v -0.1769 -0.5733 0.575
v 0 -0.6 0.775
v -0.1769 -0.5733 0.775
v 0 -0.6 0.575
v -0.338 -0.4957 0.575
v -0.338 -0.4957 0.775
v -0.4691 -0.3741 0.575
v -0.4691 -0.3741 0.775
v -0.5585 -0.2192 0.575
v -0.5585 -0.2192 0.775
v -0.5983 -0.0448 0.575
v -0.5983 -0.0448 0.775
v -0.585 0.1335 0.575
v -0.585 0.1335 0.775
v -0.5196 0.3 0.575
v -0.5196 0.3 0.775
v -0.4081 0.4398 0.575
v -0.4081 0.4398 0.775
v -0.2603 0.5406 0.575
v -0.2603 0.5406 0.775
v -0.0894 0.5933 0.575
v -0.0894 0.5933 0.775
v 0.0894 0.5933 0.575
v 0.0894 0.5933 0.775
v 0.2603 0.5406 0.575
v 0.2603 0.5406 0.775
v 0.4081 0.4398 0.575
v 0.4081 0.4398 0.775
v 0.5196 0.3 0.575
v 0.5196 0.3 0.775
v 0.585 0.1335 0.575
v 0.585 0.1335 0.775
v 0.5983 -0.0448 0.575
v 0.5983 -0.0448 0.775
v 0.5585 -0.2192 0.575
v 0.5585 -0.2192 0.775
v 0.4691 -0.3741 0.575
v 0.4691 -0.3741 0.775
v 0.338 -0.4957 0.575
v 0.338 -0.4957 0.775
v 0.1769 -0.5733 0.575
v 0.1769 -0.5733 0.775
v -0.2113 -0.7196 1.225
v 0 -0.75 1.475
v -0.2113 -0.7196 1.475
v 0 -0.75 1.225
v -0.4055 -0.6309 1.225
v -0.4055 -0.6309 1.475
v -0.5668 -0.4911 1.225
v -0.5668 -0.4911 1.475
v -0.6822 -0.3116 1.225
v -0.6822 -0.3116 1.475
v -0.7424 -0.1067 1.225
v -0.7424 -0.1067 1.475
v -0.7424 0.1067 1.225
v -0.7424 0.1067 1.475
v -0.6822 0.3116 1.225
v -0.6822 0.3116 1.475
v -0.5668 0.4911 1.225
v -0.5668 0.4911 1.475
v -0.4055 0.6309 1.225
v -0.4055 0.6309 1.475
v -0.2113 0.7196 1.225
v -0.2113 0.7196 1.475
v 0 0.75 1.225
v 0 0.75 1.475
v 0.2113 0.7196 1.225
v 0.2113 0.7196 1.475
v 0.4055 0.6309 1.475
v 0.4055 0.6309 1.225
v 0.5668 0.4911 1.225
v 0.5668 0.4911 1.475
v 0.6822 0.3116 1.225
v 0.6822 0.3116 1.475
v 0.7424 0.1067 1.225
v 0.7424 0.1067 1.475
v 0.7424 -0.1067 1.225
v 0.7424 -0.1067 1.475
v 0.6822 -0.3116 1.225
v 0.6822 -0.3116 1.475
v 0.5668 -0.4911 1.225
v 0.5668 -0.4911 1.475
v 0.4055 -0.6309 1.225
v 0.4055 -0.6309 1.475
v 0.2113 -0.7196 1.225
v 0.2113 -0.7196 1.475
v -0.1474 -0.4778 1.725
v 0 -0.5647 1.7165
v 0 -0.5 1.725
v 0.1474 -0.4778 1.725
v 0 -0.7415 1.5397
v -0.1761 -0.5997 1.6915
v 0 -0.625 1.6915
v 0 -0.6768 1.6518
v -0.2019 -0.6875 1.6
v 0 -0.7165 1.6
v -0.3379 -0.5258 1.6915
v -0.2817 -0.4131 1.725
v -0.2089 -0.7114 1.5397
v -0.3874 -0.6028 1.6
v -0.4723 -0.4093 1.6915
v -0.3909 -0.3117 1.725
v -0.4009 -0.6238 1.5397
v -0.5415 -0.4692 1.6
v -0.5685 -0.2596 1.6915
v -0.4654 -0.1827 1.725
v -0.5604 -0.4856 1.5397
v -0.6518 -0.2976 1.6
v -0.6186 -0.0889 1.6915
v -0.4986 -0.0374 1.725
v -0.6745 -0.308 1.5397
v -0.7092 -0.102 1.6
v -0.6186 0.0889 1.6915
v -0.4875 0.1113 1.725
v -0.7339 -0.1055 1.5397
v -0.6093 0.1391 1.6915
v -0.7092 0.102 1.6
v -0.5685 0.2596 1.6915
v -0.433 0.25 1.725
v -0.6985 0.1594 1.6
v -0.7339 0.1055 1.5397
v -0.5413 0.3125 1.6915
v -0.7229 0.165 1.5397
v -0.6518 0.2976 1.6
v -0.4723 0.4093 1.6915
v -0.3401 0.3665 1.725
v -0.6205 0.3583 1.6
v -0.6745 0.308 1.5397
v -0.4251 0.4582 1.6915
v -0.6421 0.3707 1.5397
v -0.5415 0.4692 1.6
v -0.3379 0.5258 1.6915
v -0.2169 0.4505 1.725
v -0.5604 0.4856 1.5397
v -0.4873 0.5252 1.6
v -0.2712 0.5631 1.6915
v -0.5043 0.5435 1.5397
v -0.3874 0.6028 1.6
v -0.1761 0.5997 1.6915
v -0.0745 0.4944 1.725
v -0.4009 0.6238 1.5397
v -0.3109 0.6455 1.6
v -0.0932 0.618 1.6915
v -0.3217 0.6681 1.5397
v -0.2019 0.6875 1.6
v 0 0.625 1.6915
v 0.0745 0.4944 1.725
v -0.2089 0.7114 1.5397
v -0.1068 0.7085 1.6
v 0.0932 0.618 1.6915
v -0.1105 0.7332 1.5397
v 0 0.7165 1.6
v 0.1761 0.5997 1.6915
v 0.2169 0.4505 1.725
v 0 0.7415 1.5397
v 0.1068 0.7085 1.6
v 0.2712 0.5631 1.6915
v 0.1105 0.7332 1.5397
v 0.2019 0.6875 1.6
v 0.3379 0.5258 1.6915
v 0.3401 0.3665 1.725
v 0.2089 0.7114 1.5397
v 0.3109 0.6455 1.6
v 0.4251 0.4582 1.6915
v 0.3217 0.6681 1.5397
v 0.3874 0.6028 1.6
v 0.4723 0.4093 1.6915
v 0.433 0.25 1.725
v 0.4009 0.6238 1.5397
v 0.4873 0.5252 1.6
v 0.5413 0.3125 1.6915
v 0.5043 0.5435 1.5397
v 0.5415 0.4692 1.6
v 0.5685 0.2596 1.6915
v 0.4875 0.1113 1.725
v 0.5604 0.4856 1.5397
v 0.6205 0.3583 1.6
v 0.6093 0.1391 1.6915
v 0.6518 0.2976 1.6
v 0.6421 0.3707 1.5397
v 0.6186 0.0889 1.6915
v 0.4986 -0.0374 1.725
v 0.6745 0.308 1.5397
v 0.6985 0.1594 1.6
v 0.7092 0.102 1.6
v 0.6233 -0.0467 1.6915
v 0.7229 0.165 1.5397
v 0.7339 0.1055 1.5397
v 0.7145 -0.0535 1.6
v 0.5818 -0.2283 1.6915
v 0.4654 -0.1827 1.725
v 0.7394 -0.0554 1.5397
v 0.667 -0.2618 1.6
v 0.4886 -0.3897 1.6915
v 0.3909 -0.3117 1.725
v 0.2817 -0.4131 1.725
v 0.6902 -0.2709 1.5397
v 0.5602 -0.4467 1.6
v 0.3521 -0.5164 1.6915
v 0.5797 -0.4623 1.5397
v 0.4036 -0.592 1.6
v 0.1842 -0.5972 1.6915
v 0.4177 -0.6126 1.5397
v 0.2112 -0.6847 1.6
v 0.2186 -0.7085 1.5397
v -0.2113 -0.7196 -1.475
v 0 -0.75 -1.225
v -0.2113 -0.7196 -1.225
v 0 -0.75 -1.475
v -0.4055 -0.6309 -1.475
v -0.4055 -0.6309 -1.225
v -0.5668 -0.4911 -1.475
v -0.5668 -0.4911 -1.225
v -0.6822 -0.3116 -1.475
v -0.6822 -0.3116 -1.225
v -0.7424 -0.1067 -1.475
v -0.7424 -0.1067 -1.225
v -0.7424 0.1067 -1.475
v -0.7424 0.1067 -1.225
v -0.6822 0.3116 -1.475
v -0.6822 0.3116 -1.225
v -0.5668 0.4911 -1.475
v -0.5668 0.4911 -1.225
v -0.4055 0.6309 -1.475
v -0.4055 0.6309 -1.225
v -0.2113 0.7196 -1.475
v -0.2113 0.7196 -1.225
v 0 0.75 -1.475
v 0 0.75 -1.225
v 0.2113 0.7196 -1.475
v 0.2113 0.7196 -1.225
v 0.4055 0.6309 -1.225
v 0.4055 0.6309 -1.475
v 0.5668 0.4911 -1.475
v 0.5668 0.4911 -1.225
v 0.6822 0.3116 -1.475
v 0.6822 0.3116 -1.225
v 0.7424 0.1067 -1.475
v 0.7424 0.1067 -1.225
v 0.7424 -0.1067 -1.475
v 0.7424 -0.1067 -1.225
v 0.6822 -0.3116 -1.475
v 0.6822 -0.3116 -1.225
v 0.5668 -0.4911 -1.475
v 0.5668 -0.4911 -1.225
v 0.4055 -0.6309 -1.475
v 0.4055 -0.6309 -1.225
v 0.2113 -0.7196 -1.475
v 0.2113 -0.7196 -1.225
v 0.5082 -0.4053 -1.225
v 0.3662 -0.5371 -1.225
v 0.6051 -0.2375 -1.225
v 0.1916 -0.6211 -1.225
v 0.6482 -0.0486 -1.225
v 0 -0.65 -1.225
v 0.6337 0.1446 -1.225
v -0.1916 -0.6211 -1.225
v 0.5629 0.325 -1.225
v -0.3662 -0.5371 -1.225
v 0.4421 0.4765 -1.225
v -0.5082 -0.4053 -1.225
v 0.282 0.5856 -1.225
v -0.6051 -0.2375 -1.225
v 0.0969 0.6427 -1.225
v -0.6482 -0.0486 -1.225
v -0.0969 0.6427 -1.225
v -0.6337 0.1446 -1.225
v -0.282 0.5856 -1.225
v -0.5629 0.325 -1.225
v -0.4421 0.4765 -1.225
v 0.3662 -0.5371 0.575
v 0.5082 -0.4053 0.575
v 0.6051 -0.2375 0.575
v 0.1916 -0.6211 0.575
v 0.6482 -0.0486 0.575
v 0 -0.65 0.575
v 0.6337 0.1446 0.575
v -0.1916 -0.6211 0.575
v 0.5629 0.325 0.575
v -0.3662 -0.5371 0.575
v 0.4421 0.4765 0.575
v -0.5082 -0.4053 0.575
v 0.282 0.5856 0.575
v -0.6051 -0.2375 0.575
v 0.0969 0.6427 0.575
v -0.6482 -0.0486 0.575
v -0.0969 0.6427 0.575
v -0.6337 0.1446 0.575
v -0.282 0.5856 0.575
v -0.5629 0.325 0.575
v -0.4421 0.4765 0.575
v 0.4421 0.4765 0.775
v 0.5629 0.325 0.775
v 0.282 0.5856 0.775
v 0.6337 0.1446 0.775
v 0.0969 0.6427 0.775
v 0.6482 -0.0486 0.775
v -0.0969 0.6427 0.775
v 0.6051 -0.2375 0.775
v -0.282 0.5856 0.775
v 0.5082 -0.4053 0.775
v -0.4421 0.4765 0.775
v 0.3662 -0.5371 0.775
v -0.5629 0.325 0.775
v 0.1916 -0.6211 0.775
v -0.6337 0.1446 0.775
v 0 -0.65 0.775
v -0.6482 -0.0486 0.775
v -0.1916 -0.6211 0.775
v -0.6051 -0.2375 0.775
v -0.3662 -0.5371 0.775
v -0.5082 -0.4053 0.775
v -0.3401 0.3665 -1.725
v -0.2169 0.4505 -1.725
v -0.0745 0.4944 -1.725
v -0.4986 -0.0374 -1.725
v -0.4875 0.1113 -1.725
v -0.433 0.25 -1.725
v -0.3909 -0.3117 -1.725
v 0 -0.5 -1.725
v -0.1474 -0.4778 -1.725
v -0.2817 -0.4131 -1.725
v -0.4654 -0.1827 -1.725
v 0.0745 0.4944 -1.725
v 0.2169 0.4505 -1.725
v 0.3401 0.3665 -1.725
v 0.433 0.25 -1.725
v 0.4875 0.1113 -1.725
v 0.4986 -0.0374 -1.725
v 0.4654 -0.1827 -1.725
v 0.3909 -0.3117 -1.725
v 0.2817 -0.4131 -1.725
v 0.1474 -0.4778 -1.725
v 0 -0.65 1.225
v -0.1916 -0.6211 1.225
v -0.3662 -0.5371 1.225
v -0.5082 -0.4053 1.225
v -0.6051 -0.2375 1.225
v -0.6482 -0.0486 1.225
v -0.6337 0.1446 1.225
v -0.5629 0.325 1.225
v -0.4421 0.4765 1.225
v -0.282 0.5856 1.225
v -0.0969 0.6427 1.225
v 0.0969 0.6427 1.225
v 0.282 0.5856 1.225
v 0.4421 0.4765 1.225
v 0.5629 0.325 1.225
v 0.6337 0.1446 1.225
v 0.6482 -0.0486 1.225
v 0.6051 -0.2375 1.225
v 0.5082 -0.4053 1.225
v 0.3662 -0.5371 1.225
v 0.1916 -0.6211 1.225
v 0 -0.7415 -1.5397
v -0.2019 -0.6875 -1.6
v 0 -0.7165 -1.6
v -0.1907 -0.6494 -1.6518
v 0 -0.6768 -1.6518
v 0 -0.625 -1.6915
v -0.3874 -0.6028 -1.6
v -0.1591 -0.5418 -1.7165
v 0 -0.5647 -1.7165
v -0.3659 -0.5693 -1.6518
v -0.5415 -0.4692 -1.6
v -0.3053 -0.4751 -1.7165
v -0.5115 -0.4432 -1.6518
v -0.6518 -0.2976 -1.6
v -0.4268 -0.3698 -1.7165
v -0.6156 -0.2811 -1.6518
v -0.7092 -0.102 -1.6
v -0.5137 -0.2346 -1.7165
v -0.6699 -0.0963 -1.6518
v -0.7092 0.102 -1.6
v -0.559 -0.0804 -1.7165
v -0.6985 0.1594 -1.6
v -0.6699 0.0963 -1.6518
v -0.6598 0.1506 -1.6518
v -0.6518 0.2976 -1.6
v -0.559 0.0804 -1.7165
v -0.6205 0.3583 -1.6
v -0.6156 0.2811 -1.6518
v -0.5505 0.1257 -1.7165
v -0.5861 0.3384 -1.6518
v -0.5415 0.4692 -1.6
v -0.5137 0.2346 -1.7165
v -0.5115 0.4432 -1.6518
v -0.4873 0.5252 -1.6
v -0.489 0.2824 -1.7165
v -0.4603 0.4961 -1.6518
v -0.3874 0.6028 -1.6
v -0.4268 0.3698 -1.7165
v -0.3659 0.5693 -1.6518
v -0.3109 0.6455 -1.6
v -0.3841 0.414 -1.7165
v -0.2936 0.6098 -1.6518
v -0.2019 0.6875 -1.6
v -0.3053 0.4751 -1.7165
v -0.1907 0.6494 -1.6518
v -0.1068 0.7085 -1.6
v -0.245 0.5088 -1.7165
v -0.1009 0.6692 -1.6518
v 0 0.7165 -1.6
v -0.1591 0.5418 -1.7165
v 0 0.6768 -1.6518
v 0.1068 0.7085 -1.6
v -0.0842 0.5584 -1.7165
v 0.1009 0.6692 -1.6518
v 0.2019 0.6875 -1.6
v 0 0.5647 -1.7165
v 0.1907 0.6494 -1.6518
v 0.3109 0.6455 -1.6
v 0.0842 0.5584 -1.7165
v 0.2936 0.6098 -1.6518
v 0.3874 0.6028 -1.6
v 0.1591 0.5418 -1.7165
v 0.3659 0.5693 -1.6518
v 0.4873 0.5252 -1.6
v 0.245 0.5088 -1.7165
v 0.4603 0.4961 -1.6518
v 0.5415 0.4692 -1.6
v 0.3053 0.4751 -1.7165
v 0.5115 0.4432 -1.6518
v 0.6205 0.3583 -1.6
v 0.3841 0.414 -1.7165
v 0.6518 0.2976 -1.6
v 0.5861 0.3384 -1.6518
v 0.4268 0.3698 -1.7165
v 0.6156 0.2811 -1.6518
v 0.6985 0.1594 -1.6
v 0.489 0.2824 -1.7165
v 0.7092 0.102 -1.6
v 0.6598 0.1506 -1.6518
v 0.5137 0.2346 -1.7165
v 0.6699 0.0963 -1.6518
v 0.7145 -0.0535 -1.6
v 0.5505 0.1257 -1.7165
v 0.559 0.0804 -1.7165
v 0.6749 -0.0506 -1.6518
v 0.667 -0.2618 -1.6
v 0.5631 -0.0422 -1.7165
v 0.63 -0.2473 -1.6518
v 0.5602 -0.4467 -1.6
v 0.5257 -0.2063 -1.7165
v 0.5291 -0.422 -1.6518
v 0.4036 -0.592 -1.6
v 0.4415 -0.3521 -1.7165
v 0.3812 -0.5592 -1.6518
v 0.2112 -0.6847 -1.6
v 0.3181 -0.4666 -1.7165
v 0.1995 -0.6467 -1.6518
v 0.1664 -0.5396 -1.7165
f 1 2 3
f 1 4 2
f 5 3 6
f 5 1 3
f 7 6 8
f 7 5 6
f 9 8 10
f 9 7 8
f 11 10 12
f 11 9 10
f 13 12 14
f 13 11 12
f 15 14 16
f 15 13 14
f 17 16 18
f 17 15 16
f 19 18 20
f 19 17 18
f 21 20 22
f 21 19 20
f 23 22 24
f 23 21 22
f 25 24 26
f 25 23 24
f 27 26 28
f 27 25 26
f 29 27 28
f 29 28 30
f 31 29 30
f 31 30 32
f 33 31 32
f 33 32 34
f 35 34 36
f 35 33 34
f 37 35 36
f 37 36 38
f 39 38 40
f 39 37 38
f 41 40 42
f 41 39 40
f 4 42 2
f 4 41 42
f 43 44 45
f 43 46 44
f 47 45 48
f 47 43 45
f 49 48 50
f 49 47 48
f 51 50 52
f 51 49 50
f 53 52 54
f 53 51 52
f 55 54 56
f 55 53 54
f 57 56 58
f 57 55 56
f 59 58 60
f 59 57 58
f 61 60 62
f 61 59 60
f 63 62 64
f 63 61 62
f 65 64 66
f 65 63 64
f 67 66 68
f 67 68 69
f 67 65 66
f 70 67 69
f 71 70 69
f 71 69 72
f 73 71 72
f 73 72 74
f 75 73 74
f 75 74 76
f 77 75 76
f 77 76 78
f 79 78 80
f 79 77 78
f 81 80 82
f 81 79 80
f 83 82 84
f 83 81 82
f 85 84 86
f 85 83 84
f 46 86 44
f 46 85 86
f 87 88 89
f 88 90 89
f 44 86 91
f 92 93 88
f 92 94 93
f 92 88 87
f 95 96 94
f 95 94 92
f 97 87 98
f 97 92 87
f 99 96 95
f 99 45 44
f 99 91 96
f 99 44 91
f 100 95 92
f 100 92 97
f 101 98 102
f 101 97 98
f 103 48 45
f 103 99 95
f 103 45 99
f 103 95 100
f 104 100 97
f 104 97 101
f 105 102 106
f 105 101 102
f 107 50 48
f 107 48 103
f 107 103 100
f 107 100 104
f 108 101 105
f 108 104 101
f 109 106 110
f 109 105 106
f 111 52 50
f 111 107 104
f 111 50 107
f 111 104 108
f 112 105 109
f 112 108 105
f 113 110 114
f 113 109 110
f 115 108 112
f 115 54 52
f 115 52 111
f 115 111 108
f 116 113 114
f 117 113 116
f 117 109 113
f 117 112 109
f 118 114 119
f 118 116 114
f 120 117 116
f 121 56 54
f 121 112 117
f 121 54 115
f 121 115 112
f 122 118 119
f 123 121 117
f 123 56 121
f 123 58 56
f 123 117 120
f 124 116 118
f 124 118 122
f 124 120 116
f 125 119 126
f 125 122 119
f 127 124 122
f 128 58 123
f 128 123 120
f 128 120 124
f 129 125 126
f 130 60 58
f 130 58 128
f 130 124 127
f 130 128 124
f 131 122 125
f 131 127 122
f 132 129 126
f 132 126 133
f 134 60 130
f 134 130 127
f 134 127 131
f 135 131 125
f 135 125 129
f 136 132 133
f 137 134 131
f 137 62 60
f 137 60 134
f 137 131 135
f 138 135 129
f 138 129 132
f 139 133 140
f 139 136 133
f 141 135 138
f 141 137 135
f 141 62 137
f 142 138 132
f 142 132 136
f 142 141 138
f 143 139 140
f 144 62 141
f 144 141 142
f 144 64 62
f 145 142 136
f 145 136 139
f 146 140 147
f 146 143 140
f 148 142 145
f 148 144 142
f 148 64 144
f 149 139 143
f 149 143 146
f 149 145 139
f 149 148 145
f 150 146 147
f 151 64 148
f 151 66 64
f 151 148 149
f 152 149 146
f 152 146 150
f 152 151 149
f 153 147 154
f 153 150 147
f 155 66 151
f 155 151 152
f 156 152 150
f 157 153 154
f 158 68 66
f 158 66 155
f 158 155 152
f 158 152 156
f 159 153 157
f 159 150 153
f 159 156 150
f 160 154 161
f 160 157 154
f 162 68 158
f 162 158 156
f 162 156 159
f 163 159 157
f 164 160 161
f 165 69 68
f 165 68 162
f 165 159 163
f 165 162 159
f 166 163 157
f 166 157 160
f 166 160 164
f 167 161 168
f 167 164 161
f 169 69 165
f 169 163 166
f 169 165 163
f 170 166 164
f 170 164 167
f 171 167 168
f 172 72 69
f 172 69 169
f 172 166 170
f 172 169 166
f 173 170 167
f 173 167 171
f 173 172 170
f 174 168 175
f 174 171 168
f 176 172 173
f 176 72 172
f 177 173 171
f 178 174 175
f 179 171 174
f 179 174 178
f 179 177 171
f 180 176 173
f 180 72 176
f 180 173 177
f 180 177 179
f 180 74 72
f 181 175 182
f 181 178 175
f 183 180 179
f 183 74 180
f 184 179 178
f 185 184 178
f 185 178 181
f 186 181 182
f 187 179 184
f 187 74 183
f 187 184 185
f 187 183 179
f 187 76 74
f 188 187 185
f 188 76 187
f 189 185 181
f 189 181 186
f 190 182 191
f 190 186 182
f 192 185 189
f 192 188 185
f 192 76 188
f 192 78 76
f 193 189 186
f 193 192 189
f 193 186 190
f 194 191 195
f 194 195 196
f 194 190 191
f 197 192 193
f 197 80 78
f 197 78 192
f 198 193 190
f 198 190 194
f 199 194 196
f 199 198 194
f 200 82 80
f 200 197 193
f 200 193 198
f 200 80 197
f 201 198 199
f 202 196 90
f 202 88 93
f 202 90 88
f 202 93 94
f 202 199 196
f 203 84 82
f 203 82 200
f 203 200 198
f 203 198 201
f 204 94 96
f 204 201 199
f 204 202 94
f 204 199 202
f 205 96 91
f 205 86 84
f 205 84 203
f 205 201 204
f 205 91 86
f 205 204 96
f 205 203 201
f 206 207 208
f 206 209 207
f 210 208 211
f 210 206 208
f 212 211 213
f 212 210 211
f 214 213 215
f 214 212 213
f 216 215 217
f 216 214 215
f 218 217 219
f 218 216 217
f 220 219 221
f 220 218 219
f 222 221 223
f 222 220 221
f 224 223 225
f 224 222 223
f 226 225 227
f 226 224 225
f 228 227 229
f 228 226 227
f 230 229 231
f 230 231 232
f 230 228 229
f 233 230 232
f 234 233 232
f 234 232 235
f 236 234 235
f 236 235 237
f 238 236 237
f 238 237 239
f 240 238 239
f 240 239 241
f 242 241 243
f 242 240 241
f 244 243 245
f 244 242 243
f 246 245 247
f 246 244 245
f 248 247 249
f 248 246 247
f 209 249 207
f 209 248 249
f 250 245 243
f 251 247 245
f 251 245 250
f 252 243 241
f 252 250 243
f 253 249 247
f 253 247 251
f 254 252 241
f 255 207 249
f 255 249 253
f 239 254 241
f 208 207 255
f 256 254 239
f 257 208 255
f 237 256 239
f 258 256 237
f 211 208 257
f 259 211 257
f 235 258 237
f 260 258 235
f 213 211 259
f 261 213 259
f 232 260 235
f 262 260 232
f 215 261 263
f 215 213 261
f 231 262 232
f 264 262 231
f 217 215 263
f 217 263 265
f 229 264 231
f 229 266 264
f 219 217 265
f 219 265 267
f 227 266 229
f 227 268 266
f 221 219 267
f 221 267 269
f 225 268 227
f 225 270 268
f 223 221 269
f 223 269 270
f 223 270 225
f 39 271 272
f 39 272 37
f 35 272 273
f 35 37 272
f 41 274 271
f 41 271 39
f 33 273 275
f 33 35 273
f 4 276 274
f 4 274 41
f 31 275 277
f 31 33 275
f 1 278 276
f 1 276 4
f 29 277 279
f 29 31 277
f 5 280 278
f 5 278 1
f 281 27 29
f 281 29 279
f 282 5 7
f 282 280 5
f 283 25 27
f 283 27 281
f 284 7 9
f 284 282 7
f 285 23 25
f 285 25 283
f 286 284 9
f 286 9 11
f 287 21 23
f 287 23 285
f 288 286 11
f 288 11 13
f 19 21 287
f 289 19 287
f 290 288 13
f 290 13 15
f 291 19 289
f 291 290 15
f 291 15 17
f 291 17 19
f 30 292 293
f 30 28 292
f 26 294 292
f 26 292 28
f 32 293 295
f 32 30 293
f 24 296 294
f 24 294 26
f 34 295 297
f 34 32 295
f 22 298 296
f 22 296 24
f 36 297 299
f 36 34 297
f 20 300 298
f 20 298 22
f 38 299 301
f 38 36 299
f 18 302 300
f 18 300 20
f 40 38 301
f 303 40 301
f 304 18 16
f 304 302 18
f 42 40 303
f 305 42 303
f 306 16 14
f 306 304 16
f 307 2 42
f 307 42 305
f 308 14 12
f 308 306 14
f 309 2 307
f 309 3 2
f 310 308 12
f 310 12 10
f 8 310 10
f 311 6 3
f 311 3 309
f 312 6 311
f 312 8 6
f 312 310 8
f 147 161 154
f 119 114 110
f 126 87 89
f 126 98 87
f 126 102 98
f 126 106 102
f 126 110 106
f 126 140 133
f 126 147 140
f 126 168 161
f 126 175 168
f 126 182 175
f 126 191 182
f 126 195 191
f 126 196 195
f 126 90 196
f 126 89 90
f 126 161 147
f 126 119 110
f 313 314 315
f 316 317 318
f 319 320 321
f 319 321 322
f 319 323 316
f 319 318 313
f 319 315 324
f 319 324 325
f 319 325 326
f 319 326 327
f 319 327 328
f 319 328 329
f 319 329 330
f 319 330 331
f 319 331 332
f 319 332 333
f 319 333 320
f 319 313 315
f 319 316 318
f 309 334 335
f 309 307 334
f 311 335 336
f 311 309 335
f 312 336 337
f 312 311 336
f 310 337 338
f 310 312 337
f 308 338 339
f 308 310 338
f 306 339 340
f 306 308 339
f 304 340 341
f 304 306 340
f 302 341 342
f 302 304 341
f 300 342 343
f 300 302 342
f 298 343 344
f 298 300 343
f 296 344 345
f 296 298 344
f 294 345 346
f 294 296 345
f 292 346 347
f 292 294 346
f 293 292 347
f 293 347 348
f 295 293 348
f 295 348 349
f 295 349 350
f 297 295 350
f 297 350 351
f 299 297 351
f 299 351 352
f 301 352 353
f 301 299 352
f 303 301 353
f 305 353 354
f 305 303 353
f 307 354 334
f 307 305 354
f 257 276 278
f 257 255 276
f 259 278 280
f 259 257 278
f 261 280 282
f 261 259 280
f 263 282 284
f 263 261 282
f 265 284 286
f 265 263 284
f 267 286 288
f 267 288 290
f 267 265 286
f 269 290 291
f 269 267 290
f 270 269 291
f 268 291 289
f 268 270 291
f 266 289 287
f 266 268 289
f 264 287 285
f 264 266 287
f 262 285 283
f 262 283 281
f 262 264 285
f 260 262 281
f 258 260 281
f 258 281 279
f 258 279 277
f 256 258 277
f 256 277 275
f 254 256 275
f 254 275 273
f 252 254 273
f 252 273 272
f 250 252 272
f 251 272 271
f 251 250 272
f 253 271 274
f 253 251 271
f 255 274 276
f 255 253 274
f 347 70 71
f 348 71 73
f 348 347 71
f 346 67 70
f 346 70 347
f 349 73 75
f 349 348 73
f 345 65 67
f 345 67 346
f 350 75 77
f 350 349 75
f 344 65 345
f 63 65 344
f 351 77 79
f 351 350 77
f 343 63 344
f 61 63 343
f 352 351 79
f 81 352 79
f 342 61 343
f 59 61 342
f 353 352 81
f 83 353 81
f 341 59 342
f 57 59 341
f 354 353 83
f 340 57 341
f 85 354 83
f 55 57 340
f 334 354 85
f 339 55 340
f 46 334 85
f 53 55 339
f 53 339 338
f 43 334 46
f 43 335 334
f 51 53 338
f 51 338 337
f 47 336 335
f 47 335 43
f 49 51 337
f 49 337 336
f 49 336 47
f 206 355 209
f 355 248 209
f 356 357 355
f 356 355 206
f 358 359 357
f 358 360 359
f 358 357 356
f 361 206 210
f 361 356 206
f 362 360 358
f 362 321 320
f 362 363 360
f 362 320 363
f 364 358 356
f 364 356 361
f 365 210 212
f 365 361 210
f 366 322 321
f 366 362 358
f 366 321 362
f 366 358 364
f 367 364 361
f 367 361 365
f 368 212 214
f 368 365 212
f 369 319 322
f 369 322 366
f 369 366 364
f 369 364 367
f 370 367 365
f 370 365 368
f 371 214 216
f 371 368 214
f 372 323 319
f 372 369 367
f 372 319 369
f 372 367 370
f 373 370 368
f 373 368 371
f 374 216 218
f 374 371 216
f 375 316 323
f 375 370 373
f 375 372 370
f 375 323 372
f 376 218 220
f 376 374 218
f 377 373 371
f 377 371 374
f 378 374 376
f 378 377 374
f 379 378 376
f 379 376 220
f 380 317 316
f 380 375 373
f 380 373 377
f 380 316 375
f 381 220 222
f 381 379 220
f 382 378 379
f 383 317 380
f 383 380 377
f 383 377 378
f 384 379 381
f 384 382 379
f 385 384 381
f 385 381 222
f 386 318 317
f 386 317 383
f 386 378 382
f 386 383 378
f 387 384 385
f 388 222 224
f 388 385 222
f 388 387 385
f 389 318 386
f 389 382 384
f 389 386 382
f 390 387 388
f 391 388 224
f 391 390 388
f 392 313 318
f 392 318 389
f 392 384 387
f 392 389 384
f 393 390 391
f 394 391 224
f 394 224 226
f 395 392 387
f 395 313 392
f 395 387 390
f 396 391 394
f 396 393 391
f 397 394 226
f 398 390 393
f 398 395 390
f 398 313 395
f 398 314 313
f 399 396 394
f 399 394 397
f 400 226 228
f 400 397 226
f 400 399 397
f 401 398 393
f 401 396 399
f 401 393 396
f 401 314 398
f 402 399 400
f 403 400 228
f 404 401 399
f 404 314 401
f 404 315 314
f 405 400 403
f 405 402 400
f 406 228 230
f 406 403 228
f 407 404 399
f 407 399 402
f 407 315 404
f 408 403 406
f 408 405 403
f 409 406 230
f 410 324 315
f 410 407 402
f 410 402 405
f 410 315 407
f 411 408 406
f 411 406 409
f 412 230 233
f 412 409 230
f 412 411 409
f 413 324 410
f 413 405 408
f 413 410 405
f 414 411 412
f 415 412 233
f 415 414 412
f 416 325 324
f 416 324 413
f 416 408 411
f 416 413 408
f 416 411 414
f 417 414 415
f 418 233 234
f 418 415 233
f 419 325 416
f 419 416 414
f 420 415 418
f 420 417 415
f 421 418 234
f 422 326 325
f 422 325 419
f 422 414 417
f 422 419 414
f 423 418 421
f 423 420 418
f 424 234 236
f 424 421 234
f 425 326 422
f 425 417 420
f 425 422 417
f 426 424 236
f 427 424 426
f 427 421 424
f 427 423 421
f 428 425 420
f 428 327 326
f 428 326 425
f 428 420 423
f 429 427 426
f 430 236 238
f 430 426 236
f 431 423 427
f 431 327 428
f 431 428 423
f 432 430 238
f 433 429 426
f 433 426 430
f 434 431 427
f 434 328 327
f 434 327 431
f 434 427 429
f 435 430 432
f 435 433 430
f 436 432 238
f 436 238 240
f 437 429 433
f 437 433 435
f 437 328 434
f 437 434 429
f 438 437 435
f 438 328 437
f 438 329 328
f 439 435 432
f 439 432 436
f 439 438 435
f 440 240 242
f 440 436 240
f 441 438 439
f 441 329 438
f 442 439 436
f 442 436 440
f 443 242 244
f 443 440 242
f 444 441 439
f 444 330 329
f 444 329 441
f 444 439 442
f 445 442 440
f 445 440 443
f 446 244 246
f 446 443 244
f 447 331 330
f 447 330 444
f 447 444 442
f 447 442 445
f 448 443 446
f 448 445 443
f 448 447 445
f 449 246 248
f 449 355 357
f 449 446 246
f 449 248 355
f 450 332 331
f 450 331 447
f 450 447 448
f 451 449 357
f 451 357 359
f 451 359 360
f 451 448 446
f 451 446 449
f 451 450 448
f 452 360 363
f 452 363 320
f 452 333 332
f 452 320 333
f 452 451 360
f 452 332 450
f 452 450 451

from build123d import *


with BuildPart() as part:
    # Sketch1 → Revolve1 (revolve)
    with BuildSketch(Plane(origin=(0, 0, 0), x_dir=(0, 0, -1), z_dir=(1, 0, 0))):
        with BuildLine():
            Line((-1.475, -0.75), (-1.225, -0.75))
            Line((-1.225, -0.75), (-1.225, -0.65))
            Line((-1.225, -0.65), (-0.775, -0.65))
            Line((-0.775, -0.65), (-0.775, -0.6))
            Line((-0.775, -0.6), (-0.575, -0.6))
            Line((-0.575, -0.6), (-0.575, -0.65))
            Line((-0.575, -0.65), (0.775, -0.65))
            Line((0.775, -0.65), (1.225, -0.65))
            Line((1.225, -0.65), (1.225, -0.75))
            Line((1.225, -0.75), (1.475, -0.75))
            ThreePointArc((1.475, -0.75), (1.651776695, -0.676776695), (1.725, -0.5))
            Line((1.725, -0.5), (1.725, 0))
            Line((1.725, 0), (-1.725, 0))
            Line((-1.725, 0), (-1.725, -0.5))
            ThreePointArc((-1.725, -0.5), (-1.651776695, -0.676776695), (-1.475, -0.75))
        make_face()
    revolve(axis=Axis((0, 0, 1.725), (0, 0, -1)))


solid = part.part
